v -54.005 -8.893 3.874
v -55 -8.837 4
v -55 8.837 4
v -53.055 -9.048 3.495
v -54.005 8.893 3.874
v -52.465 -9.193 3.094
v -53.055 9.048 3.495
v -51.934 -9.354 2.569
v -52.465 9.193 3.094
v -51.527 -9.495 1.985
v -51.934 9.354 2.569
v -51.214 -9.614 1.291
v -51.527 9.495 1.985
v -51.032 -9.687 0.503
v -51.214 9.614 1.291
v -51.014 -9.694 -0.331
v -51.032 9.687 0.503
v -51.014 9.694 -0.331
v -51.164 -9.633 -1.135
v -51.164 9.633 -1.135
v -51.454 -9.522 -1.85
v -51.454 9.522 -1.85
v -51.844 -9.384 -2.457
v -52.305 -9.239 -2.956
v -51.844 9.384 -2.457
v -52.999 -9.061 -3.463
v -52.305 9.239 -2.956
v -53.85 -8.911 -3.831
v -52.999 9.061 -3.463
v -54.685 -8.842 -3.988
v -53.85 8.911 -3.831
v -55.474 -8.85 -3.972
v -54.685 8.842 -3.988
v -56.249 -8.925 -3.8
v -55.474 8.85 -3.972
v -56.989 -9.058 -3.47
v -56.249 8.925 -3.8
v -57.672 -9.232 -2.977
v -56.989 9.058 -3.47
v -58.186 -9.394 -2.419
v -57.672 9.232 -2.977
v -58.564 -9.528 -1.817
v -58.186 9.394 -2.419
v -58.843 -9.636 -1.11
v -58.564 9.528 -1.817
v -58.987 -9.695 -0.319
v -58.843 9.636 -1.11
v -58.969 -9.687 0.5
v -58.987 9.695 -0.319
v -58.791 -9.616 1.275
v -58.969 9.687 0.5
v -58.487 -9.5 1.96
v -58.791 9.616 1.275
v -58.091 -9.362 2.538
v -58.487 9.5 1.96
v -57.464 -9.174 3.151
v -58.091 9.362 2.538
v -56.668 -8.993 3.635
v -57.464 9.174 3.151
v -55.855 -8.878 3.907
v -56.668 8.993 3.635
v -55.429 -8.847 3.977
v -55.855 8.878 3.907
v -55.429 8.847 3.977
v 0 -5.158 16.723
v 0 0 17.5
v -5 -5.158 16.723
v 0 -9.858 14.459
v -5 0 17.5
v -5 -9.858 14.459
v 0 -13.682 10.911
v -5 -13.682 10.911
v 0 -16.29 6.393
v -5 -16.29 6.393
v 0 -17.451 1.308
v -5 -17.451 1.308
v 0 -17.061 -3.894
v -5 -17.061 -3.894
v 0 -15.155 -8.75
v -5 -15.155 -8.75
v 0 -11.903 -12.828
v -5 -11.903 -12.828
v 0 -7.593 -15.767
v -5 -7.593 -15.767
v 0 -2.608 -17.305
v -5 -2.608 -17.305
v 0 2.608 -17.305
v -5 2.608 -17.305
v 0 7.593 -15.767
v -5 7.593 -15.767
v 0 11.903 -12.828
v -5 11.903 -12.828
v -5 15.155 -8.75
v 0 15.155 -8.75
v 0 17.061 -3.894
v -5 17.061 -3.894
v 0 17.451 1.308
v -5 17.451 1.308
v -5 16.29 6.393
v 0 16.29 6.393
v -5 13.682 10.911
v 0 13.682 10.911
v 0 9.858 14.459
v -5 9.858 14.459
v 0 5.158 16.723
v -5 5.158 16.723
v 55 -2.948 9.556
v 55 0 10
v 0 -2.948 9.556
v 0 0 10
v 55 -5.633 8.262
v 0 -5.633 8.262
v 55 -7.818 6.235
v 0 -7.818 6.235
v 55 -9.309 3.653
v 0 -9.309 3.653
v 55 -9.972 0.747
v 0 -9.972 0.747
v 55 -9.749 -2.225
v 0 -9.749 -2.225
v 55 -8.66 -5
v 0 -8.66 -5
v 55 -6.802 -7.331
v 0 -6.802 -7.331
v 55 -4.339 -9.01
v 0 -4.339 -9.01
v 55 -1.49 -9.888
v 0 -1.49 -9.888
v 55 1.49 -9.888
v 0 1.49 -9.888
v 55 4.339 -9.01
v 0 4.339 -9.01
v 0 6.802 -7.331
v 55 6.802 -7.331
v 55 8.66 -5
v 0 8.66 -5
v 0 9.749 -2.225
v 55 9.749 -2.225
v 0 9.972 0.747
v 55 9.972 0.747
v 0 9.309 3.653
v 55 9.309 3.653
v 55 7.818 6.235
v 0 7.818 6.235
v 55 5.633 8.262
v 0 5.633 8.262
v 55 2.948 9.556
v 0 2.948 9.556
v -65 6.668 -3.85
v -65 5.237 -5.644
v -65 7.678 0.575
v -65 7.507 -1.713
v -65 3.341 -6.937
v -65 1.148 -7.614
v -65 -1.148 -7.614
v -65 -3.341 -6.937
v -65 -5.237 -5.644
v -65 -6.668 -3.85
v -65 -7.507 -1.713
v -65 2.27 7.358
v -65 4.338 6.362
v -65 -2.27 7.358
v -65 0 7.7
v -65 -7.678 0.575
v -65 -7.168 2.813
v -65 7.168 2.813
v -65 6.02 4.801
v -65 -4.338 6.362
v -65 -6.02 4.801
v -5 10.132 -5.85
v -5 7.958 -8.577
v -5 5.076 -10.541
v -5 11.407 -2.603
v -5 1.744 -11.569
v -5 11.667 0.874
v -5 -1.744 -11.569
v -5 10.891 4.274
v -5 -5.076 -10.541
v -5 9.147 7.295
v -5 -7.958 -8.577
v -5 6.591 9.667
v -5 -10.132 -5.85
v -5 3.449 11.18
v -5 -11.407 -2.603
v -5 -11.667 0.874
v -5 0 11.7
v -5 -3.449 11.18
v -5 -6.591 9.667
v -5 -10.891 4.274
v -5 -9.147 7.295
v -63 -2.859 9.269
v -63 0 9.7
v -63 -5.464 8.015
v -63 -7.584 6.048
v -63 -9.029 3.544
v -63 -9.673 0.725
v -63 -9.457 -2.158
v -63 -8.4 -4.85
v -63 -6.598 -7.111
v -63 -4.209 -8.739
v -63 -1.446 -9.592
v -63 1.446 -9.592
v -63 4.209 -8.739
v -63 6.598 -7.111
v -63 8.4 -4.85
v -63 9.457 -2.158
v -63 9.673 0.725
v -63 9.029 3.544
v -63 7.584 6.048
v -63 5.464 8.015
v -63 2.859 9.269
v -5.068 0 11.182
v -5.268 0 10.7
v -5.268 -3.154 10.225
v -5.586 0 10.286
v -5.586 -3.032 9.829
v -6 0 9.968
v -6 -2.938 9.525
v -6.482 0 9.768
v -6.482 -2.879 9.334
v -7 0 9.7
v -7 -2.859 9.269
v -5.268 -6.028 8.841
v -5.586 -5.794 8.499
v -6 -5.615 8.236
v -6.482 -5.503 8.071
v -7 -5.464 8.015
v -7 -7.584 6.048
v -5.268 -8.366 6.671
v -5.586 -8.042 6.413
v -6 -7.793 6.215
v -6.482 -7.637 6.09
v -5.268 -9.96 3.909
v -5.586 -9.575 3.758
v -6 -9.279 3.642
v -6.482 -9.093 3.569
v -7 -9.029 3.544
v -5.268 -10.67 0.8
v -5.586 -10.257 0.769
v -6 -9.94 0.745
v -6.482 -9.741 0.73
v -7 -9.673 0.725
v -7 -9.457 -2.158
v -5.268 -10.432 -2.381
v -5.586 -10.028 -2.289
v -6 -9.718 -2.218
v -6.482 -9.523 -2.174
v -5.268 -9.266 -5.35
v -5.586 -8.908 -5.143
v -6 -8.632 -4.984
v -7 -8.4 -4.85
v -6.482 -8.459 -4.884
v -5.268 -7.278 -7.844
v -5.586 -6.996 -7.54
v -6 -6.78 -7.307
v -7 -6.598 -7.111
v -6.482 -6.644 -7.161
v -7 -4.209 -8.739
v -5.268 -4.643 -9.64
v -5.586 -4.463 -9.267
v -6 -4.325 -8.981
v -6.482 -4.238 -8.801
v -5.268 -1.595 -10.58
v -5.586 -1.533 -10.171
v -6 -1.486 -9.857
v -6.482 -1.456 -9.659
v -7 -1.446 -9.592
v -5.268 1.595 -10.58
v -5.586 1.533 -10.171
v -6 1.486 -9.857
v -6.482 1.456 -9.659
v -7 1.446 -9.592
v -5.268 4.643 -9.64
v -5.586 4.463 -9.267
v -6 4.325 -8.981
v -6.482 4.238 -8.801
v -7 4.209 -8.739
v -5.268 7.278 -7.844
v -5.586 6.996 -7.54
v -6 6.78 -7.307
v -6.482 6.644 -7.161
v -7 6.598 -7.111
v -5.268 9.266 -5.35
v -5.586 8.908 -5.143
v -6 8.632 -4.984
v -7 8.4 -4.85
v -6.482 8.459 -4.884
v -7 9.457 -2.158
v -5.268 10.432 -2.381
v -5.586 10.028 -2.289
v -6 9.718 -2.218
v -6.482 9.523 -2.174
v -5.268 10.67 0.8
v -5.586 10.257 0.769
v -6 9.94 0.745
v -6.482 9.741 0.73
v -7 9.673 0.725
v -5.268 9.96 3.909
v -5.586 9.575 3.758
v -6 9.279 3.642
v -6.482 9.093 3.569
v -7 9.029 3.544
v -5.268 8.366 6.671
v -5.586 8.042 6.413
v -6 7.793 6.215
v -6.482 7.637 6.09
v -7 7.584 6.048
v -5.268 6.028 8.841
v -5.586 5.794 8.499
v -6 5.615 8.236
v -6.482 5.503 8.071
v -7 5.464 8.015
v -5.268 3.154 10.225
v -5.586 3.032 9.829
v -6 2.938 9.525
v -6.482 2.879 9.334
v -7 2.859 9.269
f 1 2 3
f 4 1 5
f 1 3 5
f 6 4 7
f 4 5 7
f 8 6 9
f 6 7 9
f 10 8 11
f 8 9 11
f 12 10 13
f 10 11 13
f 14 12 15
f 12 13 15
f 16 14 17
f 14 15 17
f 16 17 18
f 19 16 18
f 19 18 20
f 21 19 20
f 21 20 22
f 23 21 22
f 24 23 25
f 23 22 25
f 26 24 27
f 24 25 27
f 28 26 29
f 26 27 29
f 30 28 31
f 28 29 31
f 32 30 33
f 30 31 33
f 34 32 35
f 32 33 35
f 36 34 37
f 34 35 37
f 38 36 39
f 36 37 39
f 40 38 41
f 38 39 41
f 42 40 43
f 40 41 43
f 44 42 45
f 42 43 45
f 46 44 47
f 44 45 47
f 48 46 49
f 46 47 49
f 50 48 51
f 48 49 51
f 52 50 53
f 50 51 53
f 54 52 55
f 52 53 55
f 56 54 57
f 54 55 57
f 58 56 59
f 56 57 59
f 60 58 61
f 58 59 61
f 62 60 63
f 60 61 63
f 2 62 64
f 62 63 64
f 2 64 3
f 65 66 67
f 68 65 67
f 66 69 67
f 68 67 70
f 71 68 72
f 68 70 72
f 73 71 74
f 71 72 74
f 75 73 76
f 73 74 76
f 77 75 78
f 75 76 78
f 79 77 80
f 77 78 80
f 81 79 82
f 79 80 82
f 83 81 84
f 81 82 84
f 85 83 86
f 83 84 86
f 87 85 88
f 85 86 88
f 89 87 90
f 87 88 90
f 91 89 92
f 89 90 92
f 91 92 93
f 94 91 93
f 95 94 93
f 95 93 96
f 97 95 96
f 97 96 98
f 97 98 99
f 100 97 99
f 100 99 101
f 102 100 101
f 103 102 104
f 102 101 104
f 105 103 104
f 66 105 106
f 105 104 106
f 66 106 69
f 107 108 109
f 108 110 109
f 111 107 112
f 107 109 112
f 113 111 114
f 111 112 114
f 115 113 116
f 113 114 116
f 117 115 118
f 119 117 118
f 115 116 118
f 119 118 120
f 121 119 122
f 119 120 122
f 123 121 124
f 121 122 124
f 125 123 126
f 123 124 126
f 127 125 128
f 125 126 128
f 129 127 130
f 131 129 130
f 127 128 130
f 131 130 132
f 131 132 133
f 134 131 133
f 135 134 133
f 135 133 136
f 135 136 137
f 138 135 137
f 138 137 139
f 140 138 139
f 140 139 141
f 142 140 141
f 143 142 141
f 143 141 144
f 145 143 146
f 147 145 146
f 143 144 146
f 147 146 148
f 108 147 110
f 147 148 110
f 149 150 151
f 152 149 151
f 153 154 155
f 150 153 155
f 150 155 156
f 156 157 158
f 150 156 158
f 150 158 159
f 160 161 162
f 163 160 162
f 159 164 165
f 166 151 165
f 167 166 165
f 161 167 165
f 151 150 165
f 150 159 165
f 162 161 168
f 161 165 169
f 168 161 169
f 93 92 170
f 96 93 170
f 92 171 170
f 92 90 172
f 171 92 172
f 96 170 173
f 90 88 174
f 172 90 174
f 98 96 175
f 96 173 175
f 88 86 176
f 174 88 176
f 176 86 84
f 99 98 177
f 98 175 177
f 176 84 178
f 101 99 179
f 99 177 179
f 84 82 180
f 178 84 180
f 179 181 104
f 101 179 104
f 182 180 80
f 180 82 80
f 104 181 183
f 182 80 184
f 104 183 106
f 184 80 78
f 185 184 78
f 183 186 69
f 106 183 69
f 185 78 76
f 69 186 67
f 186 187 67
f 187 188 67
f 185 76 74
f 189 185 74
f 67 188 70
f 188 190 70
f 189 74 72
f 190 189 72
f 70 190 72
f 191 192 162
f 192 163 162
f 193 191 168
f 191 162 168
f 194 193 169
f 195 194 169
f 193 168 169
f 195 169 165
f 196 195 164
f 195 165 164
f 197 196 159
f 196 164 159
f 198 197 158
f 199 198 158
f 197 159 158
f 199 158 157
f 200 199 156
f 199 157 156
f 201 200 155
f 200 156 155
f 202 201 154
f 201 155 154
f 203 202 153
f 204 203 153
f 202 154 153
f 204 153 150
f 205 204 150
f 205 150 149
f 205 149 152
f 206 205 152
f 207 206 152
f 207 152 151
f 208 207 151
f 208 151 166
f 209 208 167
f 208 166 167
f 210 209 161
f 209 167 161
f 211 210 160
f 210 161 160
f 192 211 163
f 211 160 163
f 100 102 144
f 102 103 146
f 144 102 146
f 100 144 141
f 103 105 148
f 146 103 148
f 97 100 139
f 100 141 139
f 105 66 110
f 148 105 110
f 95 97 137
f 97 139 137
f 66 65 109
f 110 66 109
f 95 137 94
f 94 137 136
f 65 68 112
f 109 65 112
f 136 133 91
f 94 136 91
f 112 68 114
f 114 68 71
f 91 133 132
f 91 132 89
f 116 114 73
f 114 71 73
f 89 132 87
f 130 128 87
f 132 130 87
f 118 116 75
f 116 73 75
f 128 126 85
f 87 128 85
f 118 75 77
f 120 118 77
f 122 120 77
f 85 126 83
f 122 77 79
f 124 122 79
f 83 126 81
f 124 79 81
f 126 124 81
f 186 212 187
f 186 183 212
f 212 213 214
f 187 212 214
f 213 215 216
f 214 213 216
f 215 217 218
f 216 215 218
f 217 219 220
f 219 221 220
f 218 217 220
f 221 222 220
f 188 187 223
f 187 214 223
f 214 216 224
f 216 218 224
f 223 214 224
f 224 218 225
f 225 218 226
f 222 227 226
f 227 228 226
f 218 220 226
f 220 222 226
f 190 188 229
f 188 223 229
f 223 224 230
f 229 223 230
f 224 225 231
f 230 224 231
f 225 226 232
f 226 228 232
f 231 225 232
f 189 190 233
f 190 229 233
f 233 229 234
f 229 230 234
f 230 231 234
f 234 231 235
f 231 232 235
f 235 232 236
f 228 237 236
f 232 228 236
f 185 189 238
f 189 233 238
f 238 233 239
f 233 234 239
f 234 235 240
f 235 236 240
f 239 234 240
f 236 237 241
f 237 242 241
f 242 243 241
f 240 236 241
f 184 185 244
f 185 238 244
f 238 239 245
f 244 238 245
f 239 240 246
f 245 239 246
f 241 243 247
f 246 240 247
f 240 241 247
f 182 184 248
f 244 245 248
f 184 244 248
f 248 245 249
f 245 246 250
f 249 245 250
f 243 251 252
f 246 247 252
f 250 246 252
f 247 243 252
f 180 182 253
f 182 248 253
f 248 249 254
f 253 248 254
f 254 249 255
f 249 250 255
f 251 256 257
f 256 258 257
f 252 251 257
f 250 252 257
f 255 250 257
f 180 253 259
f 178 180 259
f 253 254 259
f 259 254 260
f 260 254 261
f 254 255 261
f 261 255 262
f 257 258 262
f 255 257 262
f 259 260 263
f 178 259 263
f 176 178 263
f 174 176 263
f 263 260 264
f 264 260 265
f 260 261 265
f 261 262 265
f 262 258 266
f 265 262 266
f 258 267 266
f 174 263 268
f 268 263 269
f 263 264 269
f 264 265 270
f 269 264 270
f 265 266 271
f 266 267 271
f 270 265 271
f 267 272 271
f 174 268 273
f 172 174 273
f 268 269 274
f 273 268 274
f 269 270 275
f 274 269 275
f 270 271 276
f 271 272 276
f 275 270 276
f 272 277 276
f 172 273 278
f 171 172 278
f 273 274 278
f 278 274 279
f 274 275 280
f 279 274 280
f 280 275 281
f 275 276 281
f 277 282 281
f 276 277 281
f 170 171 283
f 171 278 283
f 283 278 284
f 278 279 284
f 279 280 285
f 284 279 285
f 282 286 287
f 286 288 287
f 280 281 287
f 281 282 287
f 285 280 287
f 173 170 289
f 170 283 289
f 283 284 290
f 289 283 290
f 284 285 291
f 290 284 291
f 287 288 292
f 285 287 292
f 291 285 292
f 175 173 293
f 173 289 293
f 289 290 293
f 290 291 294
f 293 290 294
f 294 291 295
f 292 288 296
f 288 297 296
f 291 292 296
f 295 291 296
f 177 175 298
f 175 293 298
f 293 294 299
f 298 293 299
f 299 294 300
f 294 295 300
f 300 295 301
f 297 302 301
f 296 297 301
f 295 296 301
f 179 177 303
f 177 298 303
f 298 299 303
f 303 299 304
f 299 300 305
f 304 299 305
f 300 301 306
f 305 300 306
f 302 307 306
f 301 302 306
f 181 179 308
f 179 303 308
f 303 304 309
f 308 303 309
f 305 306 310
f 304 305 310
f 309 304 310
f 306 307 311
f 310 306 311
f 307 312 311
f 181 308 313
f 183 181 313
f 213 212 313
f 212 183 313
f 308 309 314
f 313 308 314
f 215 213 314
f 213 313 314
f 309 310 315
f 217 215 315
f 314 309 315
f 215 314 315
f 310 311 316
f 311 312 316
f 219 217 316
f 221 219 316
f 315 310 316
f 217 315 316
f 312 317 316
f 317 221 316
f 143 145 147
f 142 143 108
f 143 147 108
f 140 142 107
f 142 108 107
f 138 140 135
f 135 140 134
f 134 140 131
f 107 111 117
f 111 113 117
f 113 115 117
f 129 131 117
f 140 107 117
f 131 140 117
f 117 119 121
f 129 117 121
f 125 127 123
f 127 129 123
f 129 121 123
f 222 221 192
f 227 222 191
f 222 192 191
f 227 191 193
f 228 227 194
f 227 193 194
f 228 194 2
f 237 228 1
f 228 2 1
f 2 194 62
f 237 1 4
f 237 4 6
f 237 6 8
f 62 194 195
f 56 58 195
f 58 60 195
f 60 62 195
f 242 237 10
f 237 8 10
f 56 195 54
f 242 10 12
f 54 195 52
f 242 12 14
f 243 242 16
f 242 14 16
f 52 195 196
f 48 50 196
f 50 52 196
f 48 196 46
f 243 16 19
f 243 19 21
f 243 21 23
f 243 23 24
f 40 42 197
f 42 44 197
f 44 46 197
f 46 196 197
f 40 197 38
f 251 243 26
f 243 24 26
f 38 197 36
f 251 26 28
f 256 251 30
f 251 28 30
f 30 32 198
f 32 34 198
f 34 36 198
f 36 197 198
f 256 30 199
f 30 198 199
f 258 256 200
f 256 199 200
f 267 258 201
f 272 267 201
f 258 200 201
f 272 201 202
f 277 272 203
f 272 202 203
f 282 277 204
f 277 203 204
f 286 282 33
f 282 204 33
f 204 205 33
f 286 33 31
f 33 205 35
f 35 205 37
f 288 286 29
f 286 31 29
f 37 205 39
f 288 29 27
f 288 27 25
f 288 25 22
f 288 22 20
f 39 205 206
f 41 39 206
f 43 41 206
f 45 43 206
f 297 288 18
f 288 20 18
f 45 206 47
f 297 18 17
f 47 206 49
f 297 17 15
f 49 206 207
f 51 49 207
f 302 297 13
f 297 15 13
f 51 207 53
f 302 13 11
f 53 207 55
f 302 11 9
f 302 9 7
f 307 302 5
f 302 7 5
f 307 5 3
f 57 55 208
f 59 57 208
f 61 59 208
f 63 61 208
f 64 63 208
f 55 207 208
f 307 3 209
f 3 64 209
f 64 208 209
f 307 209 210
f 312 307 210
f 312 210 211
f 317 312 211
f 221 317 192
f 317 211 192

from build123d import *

# Parameters (mm, degrees)
CONG_1_R                     = 2
ESQUISSE2_R                  = 4
ENL_V_MAT_EXTRU_1_DEPTH      = 18.5
ENL_V_MAT_EXTRU_1_DEPTH_BACK = 18.5


with BuildPart() as part:
    # Esquisse1 → Révolution1 (revolve)
    with BuildSketch(Plane.XY, mode=Mode.PRIVATE) as r_volution1_sk:
        Polygon((55, 0), (55, 10), (0, 10), (0, 17.5), (-5, 17.5), (-5, 9.7), (-63, 9.7), (-65, 7.7), (-65, 0), align=None)
    revolve(r_volution1_sk.sketch.rotate(Axis((0, 0, 0), (1, 0, 0)), 90), axis=Axis((0, 0, 0), (1, 0, 0)))  # turned: the seam where the file's is

    # Congé1
    cong_1_edges = [part.edges().sort_by_distance(p)[0] for p in [
        (-5, 0, -9.7),
    ]]
    fillet(cong_1_edges, radius=CONG_1_R)

    # Esquisse2 → Enlèv. mat.-Extru.1 (cut, two sides)
    with BuildSketch(Plane(origin=(0, 0, 0), x_dir=(1, 0, 0), z_dir=(0, 1, 0))) as enl_v_mat_extru_1_sk:
        with Locations(Location((-55, 0, 0), (0, 0, 270))):  # turned: the seam where the file's is
            Circle(ESQUISSE2_R)
    extrude(amount=ENL_V_MAT_EXTRU_1_DEPTH, mode=Mode.SUBTRACT)
    extrude(enl_v_mat_extru_1_sk.sketch, amount=-ENL_V_MAT_EXTRU_1_DEPTH_BACK, mode=Mode.SUBTRACT)


solid = part.part
